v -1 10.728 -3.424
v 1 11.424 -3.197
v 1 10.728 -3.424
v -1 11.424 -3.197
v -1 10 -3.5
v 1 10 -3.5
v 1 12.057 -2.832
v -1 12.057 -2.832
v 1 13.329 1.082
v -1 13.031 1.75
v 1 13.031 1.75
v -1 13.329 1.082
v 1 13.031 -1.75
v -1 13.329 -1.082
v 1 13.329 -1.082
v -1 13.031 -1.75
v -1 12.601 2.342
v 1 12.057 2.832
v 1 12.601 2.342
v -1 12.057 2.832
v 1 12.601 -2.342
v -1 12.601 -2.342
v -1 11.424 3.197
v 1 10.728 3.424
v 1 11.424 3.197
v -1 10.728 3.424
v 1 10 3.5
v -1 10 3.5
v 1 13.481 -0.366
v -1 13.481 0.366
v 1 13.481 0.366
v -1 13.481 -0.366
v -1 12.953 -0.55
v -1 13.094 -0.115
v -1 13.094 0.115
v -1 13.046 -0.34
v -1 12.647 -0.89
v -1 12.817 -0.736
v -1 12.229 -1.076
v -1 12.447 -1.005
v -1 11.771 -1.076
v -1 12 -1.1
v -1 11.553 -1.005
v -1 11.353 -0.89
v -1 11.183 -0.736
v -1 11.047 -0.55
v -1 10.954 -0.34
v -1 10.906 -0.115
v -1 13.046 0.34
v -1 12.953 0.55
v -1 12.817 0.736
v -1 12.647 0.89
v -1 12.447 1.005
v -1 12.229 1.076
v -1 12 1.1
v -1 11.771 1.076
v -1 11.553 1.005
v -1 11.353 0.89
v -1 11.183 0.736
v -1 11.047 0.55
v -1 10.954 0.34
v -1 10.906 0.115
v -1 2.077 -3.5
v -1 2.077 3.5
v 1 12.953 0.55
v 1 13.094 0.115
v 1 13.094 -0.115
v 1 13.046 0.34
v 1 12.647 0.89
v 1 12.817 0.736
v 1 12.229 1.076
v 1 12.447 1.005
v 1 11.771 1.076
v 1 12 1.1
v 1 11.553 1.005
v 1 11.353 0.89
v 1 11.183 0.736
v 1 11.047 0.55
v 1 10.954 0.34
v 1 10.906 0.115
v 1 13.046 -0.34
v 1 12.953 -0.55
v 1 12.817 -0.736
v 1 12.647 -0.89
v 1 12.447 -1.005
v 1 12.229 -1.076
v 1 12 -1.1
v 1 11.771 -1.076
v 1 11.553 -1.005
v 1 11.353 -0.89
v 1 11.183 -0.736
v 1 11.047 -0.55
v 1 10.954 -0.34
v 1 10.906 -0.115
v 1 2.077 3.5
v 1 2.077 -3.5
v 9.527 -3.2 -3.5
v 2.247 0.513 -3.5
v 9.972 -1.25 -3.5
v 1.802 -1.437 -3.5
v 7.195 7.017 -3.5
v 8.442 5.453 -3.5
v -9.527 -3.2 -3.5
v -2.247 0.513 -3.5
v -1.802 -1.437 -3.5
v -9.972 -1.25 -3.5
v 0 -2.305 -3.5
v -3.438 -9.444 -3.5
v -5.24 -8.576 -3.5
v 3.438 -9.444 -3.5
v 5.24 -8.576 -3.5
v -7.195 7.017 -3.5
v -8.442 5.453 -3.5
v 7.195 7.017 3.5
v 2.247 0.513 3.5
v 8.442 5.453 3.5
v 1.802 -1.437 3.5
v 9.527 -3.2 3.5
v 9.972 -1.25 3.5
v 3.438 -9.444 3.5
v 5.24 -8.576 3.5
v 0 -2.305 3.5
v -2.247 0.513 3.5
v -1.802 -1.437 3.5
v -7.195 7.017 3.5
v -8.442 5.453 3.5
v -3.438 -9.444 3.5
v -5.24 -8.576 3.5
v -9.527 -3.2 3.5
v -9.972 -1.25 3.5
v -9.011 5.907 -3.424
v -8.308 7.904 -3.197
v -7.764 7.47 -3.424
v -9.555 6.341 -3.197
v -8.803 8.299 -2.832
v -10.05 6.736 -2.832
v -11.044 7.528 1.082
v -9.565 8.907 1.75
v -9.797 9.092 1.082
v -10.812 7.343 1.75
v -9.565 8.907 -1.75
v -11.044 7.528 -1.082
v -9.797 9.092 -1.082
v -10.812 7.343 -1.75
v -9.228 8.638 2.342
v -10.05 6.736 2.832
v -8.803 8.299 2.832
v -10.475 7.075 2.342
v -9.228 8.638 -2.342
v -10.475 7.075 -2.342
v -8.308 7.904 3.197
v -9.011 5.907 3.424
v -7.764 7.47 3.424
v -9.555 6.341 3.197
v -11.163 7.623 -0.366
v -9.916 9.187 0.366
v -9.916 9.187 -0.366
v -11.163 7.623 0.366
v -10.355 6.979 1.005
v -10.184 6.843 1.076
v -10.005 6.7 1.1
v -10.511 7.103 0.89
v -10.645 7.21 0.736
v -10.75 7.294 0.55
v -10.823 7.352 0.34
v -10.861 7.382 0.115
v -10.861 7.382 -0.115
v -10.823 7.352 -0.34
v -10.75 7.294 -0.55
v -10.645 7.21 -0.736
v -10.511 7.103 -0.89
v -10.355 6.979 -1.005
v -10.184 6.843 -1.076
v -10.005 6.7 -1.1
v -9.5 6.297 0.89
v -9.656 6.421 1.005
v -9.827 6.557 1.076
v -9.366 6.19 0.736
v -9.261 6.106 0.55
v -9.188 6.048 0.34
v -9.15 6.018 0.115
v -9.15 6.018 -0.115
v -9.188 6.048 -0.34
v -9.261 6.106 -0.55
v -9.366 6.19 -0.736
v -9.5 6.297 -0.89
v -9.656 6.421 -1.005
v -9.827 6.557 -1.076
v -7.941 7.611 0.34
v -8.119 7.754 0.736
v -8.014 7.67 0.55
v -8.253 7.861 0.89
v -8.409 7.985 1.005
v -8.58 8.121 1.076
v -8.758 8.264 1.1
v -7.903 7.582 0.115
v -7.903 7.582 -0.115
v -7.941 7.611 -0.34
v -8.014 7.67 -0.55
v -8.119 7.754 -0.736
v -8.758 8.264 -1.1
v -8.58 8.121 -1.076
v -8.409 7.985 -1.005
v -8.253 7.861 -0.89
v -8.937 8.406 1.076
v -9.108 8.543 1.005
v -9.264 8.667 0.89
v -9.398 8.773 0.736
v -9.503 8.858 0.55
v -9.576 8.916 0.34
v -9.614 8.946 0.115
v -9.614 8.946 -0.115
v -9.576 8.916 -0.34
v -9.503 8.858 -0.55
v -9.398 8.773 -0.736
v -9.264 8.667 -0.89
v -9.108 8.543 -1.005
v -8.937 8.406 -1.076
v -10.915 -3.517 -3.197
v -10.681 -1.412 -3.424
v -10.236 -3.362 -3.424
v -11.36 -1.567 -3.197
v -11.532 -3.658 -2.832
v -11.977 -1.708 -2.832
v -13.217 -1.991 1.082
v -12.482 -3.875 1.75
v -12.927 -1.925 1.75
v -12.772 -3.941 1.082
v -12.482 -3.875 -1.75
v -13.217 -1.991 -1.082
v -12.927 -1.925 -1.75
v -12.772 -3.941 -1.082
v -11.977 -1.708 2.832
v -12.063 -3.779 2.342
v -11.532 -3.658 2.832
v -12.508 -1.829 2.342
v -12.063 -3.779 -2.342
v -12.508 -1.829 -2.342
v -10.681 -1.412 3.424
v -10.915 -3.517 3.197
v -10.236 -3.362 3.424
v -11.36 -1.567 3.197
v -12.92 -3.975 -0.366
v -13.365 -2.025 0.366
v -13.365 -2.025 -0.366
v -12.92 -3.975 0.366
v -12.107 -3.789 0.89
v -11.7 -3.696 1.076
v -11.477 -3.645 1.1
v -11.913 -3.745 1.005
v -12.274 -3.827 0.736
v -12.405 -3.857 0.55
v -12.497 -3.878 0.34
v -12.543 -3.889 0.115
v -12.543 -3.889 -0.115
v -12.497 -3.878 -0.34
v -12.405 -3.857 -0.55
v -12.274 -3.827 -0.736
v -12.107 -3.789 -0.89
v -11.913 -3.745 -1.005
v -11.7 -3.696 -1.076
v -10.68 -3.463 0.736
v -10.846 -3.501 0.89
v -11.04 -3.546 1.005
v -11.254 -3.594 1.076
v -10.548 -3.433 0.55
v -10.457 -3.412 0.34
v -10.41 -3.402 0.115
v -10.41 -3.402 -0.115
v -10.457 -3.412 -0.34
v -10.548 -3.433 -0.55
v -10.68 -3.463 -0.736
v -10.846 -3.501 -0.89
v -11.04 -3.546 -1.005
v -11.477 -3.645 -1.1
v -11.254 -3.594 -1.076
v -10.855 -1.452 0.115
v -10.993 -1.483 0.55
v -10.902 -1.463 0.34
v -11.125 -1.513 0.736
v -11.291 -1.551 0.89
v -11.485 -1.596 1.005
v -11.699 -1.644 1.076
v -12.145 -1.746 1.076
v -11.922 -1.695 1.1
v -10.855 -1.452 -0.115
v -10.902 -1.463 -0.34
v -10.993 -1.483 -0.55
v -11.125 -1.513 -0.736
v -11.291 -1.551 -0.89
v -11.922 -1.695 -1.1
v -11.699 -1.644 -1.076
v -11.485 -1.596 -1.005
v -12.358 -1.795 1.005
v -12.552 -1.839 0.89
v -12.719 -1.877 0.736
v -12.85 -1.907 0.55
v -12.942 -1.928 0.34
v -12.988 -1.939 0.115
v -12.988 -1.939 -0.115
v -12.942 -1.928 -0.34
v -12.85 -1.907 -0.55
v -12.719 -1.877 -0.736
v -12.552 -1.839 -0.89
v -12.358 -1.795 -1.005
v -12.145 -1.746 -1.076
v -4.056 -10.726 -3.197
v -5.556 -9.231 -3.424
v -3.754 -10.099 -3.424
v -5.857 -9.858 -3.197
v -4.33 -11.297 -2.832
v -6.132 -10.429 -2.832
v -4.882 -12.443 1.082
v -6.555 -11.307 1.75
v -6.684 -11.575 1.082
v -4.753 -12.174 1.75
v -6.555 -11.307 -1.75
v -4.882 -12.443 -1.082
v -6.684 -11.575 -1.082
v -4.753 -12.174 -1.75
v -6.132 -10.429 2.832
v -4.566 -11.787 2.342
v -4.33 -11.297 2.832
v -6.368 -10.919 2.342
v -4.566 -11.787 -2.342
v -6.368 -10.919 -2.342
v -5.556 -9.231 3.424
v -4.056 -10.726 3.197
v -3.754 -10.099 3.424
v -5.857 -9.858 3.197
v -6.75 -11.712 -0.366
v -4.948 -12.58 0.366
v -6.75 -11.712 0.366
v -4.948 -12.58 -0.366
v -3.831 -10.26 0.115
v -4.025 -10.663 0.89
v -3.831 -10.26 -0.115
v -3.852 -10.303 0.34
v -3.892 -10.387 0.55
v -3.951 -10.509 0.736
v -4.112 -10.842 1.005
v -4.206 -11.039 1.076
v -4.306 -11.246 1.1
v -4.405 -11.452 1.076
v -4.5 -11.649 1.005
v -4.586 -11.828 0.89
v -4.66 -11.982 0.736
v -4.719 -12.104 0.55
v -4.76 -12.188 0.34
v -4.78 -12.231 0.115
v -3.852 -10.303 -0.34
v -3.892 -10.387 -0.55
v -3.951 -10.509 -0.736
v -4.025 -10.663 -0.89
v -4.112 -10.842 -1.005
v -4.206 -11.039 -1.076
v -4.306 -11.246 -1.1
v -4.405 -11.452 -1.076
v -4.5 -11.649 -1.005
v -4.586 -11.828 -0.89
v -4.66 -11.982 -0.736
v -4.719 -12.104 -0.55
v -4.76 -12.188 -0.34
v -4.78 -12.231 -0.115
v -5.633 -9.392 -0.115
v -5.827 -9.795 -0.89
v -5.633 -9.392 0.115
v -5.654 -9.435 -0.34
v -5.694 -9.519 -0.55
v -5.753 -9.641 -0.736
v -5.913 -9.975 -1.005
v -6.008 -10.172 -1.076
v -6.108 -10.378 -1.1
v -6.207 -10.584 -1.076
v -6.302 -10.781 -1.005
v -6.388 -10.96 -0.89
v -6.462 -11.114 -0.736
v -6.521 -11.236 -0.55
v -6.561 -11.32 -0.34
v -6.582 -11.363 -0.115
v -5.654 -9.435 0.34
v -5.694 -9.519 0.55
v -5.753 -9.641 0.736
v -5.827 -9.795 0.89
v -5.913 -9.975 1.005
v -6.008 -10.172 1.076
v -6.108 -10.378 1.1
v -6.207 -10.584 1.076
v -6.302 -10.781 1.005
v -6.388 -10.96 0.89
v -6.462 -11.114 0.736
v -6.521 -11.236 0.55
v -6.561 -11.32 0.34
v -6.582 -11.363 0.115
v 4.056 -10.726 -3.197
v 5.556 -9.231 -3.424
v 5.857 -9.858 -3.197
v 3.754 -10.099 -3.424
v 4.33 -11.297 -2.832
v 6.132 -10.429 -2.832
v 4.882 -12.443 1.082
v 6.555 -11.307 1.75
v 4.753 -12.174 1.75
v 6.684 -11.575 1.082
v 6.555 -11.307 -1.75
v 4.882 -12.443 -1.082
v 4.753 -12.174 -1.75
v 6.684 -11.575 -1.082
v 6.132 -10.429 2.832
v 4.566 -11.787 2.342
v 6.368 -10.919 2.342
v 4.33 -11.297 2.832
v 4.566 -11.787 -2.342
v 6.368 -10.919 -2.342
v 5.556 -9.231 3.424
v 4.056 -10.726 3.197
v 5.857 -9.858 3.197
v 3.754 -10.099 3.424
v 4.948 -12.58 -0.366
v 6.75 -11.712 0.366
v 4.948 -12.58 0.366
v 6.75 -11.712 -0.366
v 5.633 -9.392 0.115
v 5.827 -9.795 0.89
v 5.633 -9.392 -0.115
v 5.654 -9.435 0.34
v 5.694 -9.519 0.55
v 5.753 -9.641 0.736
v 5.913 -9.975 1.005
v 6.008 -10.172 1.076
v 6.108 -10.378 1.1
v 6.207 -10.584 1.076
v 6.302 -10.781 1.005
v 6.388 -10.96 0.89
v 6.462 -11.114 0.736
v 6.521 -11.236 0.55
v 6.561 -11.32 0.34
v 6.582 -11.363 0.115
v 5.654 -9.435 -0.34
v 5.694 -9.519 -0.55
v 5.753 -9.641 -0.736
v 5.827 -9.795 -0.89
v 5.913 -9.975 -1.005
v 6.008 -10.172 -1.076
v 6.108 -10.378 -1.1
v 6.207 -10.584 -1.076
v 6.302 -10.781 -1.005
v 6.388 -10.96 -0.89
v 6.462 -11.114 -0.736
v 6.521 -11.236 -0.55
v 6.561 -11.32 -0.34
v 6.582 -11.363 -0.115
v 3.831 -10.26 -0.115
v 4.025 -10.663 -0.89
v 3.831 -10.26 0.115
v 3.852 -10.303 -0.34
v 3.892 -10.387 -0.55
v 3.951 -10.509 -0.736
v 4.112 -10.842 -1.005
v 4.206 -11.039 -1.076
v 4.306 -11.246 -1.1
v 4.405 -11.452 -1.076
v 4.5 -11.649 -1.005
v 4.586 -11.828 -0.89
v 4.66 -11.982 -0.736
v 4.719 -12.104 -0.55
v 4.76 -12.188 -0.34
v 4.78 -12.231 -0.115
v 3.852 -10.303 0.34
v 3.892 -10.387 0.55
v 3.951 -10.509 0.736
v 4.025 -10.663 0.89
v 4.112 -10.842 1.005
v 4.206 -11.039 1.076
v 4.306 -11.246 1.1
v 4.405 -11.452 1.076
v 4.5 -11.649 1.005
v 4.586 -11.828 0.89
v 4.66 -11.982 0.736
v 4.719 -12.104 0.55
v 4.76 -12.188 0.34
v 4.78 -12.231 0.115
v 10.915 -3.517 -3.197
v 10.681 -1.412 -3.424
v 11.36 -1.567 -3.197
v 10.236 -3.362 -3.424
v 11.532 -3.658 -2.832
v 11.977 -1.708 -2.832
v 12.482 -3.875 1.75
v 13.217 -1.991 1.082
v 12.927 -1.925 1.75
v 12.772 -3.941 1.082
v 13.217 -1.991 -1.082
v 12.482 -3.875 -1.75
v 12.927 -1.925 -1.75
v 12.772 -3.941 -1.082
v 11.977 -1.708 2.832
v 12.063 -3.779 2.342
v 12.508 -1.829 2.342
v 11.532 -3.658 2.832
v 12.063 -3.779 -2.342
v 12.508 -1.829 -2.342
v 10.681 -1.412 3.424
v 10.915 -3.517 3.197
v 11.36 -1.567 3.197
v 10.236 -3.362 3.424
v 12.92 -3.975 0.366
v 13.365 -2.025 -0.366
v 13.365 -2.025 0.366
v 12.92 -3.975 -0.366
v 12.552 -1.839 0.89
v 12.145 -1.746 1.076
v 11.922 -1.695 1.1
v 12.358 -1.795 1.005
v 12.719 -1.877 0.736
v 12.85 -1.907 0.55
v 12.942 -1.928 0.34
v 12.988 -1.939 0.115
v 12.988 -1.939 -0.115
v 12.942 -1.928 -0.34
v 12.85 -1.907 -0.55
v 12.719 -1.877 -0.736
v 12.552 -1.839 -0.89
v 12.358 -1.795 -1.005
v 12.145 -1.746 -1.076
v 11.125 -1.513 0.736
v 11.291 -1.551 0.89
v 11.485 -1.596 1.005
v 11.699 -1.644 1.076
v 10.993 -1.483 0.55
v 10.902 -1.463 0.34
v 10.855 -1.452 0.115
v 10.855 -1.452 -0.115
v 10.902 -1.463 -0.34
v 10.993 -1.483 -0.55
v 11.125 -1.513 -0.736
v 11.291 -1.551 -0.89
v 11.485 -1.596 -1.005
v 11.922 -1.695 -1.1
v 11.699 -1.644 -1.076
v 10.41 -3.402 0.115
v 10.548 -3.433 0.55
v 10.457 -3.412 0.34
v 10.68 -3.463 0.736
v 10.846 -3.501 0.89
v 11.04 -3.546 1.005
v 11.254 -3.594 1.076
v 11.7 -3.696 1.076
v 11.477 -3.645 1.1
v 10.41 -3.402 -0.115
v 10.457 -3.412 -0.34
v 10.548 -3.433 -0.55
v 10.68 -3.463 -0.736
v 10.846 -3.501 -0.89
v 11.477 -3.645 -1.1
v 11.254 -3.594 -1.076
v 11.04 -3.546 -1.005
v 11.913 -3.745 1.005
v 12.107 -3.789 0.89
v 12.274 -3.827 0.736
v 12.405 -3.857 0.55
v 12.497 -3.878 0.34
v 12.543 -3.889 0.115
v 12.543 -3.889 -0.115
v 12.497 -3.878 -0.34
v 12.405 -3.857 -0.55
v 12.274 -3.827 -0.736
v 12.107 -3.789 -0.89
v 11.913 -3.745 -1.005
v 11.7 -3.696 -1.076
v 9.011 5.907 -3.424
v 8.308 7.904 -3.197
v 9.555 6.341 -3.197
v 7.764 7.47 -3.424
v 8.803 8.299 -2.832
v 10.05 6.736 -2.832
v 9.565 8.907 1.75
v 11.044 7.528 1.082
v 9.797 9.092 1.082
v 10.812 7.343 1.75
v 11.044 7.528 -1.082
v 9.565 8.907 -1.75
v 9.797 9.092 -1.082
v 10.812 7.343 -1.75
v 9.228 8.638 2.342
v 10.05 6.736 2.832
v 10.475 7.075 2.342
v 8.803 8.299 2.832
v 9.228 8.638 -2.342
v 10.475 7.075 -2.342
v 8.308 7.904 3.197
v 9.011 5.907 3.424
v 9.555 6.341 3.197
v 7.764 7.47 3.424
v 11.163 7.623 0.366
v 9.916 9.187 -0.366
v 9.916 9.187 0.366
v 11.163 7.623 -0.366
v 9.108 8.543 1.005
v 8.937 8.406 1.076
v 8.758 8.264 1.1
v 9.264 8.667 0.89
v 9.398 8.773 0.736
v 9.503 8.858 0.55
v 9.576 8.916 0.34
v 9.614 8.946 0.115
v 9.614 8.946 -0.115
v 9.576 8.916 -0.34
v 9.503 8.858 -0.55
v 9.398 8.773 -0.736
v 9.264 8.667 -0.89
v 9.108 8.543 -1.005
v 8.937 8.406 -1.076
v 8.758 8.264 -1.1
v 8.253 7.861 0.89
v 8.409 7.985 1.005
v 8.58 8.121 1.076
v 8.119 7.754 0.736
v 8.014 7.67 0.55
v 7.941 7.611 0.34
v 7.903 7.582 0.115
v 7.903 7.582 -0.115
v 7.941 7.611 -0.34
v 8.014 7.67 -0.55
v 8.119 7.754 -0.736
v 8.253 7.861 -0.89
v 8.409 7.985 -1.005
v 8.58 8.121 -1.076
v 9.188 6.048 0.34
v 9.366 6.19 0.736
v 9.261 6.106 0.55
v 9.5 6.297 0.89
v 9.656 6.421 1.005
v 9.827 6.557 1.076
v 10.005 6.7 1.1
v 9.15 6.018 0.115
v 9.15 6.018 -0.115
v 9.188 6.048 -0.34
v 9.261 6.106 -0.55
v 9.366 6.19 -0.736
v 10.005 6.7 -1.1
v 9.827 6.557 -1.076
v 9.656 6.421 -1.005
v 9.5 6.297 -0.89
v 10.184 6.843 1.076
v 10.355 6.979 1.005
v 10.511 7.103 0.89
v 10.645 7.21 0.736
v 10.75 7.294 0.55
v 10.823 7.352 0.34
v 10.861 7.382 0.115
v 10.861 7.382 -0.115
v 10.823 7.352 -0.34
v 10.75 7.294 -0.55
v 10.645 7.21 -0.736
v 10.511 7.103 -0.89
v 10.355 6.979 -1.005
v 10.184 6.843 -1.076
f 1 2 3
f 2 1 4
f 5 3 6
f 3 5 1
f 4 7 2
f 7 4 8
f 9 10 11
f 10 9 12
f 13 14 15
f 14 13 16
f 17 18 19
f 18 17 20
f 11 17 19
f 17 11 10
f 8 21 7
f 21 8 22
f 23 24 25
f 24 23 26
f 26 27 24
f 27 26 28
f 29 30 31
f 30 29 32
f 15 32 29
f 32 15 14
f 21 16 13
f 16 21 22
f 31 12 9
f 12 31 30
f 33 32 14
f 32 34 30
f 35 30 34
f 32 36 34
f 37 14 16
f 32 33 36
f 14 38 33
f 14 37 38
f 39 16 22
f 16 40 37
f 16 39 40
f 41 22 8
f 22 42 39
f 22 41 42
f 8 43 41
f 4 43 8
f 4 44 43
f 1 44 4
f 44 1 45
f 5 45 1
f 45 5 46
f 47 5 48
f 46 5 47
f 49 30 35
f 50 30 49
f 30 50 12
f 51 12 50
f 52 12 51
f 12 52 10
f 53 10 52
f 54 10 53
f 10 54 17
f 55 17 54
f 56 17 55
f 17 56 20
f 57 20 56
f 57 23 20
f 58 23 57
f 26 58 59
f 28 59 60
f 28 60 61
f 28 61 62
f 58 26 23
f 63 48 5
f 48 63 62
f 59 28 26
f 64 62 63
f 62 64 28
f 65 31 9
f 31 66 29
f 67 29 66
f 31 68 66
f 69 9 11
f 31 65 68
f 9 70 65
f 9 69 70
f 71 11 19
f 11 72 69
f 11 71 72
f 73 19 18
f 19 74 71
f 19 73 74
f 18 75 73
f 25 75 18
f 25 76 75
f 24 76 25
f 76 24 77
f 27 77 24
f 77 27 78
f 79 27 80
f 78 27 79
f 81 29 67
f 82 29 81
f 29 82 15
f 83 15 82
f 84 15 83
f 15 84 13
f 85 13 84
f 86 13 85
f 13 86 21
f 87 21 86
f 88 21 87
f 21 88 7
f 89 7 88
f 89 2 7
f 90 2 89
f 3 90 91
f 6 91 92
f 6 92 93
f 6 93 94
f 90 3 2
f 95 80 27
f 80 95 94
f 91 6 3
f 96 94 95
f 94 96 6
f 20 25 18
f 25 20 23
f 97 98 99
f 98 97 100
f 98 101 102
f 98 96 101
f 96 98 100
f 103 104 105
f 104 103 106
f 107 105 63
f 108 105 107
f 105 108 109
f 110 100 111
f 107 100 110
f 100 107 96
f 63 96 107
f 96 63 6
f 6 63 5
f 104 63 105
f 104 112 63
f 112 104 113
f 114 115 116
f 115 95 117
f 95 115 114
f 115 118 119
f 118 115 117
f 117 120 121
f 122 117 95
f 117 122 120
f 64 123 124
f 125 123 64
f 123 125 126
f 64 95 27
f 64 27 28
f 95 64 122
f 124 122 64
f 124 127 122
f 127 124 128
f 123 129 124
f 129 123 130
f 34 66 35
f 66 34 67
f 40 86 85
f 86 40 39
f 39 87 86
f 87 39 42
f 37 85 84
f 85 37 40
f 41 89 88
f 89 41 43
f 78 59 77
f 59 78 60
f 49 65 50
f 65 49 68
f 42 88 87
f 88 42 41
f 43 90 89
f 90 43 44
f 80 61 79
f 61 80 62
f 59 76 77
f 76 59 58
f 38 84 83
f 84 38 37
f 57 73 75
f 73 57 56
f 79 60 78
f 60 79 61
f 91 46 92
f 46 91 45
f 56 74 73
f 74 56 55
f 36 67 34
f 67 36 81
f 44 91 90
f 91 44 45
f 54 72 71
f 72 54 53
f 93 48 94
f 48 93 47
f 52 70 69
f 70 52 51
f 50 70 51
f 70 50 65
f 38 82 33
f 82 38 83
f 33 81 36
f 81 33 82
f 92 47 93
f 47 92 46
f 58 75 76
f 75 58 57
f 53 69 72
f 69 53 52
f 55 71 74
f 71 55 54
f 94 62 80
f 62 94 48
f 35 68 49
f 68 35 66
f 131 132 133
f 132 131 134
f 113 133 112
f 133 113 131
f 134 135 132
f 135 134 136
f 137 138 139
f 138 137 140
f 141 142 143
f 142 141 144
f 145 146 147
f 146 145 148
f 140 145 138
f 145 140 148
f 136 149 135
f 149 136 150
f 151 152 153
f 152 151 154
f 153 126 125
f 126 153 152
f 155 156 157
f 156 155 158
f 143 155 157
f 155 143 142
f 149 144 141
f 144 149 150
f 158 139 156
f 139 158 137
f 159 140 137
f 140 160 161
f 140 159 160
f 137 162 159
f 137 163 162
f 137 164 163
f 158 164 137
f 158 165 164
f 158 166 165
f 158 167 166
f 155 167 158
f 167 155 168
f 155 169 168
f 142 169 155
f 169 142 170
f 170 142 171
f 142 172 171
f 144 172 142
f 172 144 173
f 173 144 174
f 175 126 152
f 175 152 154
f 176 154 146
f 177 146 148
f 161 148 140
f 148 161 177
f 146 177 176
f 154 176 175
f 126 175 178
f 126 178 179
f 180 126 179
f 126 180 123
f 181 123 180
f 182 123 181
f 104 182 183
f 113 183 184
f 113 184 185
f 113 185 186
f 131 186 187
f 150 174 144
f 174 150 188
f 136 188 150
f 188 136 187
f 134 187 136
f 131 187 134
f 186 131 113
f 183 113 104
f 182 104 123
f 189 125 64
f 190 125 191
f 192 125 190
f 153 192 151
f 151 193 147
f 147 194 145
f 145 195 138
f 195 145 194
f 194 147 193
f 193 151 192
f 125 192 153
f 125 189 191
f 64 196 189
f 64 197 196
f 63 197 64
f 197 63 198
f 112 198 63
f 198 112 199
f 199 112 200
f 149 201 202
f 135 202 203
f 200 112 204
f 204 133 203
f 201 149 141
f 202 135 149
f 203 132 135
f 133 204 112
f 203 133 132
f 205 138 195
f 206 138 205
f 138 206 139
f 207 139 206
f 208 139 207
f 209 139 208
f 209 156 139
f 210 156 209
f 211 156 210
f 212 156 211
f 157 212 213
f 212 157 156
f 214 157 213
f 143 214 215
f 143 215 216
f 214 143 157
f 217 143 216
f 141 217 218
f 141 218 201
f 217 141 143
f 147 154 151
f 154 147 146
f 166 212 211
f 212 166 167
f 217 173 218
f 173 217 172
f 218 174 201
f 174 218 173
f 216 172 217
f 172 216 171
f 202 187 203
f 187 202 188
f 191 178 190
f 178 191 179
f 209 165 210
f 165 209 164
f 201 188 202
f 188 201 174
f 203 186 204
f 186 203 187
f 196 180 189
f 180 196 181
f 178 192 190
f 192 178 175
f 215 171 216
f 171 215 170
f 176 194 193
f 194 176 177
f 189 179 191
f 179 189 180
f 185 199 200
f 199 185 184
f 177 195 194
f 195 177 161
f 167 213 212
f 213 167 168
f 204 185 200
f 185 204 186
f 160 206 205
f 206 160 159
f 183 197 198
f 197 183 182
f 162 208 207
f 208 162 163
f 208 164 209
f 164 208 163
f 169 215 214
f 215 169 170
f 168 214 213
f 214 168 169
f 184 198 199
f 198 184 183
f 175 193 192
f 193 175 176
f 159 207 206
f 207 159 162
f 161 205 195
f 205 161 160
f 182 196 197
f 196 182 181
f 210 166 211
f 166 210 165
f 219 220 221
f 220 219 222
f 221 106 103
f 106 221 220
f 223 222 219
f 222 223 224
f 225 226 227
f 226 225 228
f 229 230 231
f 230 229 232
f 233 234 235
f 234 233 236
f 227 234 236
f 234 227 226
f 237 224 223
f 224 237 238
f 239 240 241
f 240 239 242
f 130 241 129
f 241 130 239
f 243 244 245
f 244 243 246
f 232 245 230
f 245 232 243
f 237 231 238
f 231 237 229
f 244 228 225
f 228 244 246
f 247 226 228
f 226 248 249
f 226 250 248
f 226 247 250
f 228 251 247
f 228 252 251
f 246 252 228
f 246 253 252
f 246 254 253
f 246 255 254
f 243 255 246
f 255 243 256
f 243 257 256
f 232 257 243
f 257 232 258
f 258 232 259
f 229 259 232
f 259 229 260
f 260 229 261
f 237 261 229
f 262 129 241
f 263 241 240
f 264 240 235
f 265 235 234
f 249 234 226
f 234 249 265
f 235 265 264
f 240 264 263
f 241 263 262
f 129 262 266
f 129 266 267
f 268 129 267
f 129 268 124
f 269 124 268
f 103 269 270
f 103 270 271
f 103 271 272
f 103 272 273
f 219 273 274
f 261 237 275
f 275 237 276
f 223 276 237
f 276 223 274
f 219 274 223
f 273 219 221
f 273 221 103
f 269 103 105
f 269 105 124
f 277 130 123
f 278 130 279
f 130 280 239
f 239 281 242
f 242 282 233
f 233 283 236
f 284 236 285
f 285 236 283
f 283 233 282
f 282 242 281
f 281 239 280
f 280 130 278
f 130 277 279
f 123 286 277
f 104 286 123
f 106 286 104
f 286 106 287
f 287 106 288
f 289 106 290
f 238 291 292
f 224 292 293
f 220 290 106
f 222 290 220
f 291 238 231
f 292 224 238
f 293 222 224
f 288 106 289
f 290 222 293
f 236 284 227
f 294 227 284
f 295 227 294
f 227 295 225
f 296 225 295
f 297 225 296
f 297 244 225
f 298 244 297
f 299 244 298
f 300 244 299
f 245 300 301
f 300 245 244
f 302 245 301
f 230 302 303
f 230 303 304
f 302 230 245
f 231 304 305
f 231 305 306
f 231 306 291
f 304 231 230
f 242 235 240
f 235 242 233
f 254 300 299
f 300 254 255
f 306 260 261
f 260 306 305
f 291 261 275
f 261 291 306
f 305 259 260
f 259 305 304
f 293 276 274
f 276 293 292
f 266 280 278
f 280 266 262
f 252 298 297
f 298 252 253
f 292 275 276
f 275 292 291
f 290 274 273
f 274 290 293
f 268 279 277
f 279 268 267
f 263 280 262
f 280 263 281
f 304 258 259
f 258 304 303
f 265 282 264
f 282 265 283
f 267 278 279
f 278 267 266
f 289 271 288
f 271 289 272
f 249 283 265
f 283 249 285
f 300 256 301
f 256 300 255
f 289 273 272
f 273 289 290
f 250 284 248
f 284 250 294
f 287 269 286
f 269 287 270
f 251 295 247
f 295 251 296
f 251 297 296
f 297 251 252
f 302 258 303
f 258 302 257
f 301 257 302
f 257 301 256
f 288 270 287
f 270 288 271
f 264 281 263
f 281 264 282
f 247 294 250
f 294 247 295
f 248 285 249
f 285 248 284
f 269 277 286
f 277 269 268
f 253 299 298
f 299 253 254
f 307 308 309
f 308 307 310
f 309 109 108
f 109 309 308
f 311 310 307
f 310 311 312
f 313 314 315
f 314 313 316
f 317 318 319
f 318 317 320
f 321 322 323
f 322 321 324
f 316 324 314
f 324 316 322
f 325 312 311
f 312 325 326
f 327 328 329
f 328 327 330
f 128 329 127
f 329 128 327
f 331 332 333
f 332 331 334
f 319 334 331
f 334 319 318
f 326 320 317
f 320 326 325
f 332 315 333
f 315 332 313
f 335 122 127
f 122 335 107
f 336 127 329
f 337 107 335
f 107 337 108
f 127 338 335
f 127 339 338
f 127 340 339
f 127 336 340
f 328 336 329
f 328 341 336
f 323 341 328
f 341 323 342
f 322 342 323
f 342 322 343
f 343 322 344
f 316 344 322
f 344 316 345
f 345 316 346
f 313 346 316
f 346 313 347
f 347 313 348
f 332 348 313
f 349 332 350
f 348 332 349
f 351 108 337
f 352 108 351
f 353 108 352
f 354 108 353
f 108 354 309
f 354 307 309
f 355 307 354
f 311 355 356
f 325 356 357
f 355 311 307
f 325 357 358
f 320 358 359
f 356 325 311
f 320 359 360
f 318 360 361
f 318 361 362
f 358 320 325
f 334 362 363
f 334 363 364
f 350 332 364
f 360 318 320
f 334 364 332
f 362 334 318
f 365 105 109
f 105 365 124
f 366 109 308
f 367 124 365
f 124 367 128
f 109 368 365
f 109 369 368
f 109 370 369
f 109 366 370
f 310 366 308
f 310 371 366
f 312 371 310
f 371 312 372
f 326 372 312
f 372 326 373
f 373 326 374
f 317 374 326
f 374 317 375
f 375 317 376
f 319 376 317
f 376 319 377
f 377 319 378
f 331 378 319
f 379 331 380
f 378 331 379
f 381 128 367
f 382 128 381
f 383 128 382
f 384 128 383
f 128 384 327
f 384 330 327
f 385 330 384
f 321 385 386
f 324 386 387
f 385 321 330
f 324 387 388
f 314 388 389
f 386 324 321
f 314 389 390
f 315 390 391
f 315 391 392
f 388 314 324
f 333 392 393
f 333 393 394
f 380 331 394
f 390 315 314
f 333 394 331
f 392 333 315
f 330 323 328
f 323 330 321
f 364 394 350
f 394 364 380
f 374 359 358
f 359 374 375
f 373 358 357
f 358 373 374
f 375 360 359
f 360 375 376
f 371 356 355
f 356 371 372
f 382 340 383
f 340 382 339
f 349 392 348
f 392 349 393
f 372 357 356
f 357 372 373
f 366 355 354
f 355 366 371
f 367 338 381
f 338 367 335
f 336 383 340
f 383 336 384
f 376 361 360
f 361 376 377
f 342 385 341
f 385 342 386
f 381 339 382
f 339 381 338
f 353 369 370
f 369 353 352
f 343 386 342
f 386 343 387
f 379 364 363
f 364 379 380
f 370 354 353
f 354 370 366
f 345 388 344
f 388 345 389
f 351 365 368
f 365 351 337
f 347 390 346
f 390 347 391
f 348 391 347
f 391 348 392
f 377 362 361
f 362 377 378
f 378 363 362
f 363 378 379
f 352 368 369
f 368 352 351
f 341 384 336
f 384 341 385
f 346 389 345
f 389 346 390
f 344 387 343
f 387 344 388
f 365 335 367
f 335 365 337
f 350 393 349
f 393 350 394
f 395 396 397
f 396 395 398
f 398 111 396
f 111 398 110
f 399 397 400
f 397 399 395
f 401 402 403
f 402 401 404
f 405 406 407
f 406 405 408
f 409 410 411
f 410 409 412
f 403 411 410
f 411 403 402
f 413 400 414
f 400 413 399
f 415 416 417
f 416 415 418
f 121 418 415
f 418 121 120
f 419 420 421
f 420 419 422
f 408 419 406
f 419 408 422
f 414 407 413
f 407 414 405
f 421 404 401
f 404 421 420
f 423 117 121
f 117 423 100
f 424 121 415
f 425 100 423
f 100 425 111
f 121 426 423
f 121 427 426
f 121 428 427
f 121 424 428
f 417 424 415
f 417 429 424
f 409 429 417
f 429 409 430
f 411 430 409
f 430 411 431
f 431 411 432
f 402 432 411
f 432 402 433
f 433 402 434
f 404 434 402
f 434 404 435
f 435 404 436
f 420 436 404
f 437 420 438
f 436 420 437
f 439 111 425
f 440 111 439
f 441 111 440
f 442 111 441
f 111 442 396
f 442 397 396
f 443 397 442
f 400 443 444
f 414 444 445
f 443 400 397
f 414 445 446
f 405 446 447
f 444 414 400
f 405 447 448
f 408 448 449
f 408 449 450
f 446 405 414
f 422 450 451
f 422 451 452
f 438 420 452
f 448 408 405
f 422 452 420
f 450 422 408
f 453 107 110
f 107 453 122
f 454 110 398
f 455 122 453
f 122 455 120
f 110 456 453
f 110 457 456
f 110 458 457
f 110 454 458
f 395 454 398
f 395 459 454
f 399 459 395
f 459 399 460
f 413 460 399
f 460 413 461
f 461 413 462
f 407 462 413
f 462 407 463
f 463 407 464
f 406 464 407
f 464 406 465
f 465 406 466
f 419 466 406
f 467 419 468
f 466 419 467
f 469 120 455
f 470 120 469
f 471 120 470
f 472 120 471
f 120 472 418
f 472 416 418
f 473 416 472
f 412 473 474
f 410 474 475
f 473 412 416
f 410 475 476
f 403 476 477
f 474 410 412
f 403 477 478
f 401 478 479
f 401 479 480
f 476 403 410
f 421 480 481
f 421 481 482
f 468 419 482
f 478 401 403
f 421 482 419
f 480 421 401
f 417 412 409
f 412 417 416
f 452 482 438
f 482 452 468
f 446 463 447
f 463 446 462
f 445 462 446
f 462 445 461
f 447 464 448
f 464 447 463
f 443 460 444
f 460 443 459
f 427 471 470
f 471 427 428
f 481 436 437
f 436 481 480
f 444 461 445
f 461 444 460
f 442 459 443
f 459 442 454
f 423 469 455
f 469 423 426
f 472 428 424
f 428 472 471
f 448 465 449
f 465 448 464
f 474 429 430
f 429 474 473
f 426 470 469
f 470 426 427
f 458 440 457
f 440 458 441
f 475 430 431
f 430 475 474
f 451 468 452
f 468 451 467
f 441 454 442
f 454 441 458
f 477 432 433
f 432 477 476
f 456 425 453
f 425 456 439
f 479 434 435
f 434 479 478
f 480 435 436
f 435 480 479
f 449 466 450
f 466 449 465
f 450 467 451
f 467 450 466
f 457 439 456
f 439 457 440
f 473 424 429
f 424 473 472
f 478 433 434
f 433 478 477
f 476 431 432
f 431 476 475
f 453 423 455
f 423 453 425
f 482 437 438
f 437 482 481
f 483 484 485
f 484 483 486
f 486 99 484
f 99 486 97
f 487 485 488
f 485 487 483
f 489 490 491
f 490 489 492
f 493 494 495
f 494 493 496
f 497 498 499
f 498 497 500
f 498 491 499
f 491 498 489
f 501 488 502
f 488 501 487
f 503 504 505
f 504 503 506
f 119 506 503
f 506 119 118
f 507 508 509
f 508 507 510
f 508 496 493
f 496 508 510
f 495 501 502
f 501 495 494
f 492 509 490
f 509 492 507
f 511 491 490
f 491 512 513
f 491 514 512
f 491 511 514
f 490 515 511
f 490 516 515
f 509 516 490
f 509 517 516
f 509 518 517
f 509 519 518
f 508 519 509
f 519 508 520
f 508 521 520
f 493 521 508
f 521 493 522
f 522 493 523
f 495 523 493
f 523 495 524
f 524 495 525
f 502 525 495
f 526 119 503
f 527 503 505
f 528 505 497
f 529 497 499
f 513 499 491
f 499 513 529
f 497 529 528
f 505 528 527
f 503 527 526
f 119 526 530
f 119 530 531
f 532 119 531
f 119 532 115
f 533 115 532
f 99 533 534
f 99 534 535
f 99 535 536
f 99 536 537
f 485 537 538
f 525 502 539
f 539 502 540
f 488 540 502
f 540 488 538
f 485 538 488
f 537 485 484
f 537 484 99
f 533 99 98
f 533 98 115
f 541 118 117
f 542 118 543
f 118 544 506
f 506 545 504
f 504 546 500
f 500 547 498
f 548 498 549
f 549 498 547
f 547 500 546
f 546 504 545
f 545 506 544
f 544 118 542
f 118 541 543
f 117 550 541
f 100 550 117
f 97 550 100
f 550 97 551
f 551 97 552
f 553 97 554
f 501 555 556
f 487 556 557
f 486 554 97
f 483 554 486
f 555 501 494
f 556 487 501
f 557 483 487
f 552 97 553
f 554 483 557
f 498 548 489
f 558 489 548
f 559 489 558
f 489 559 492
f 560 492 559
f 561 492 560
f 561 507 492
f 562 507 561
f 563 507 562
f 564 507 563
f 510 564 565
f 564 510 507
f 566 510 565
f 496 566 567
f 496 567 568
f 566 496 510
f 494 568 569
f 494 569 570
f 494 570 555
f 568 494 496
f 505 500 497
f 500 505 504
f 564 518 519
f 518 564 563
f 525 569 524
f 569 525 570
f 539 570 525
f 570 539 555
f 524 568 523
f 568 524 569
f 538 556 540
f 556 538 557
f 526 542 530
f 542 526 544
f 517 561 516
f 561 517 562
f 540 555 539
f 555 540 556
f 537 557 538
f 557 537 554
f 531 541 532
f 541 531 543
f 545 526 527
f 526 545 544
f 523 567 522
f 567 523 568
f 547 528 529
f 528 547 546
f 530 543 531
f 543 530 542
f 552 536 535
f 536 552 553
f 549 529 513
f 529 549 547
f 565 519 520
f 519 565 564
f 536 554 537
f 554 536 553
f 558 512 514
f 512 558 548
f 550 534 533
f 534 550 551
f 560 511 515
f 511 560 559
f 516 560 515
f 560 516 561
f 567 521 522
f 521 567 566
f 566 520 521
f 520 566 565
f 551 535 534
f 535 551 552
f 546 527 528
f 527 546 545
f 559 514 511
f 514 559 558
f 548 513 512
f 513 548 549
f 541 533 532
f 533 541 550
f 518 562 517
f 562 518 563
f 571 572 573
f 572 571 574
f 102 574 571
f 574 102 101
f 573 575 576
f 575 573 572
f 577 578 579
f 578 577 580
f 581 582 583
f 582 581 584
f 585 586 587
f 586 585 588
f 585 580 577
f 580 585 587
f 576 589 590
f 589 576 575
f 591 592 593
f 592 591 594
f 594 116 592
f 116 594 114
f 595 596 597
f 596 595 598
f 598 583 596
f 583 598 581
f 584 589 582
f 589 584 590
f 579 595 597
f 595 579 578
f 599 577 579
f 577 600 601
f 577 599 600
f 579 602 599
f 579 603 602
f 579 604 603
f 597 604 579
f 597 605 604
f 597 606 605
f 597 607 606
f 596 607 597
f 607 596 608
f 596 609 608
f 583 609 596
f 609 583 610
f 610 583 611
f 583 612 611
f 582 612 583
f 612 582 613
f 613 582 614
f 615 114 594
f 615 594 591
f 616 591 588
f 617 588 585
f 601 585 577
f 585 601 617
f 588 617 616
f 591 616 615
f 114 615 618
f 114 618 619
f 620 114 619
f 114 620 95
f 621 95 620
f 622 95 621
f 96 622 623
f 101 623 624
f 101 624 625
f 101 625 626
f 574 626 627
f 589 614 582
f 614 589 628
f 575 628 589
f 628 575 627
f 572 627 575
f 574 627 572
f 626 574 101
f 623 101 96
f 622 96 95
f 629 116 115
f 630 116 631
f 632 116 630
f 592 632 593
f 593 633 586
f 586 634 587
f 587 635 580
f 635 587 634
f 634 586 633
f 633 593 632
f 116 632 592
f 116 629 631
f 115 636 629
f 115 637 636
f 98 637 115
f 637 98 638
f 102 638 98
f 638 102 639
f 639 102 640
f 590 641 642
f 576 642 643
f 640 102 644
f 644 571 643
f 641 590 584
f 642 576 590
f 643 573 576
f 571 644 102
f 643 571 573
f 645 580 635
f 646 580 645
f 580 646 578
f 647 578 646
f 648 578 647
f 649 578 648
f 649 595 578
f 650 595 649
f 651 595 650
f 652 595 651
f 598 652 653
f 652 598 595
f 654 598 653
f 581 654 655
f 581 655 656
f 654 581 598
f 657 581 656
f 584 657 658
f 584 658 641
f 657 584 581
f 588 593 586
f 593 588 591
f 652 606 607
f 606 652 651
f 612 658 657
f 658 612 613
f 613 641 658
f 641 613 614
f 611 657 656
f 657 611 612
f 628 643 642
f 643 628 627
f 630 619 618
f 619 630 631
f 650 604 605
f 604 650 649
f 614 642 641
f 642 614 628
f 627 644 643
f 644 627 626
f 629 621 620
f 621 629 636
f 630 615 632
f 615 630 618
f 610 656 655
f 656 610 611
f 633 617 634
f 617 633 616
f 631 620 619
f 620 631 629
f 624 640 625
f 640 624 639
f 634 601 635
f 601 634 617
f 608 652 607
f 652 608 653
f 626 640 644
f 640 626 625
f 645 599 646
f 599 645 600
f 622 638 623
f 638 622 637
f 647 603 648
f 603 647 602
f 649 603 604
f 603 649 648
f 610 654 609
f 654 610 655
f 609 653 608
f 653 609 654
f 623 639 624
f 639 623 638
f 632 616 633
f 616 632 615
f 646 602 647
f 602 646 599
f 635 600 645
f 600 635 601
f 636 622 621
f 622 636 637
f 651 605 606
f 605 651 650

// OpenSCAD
spoke_length = 10;
outer_diameter = 7;
spoke_width = 2;
spoke_hole_r = 1.0 + 0.1;
wheel_num = 7;
num_wheels = wheel_num;
hole_offset = -2;
for(wheel_num = [1: num_wheels]) {
        rotate([0, 0, 360/num_wheels * (wheel_num-1)])
        rotate([0, 90, 0])
    translate([0, spoke_length, 0]) {
difference() {
union() {
    cylinder(r = outer_diameter/2, h = spoke_width, center = true, $fn = 30);
    
    translate([0, -spoke_length/2, 0])
    cube([outer_diameter, spoke_length, spoke_width], center=true);
}
translate([0, -hole_offset, 0]) {
cylinder(r = spoke_hole_r, h = spoke_width, center = true, $fn = 30);
}
}
}
}//
